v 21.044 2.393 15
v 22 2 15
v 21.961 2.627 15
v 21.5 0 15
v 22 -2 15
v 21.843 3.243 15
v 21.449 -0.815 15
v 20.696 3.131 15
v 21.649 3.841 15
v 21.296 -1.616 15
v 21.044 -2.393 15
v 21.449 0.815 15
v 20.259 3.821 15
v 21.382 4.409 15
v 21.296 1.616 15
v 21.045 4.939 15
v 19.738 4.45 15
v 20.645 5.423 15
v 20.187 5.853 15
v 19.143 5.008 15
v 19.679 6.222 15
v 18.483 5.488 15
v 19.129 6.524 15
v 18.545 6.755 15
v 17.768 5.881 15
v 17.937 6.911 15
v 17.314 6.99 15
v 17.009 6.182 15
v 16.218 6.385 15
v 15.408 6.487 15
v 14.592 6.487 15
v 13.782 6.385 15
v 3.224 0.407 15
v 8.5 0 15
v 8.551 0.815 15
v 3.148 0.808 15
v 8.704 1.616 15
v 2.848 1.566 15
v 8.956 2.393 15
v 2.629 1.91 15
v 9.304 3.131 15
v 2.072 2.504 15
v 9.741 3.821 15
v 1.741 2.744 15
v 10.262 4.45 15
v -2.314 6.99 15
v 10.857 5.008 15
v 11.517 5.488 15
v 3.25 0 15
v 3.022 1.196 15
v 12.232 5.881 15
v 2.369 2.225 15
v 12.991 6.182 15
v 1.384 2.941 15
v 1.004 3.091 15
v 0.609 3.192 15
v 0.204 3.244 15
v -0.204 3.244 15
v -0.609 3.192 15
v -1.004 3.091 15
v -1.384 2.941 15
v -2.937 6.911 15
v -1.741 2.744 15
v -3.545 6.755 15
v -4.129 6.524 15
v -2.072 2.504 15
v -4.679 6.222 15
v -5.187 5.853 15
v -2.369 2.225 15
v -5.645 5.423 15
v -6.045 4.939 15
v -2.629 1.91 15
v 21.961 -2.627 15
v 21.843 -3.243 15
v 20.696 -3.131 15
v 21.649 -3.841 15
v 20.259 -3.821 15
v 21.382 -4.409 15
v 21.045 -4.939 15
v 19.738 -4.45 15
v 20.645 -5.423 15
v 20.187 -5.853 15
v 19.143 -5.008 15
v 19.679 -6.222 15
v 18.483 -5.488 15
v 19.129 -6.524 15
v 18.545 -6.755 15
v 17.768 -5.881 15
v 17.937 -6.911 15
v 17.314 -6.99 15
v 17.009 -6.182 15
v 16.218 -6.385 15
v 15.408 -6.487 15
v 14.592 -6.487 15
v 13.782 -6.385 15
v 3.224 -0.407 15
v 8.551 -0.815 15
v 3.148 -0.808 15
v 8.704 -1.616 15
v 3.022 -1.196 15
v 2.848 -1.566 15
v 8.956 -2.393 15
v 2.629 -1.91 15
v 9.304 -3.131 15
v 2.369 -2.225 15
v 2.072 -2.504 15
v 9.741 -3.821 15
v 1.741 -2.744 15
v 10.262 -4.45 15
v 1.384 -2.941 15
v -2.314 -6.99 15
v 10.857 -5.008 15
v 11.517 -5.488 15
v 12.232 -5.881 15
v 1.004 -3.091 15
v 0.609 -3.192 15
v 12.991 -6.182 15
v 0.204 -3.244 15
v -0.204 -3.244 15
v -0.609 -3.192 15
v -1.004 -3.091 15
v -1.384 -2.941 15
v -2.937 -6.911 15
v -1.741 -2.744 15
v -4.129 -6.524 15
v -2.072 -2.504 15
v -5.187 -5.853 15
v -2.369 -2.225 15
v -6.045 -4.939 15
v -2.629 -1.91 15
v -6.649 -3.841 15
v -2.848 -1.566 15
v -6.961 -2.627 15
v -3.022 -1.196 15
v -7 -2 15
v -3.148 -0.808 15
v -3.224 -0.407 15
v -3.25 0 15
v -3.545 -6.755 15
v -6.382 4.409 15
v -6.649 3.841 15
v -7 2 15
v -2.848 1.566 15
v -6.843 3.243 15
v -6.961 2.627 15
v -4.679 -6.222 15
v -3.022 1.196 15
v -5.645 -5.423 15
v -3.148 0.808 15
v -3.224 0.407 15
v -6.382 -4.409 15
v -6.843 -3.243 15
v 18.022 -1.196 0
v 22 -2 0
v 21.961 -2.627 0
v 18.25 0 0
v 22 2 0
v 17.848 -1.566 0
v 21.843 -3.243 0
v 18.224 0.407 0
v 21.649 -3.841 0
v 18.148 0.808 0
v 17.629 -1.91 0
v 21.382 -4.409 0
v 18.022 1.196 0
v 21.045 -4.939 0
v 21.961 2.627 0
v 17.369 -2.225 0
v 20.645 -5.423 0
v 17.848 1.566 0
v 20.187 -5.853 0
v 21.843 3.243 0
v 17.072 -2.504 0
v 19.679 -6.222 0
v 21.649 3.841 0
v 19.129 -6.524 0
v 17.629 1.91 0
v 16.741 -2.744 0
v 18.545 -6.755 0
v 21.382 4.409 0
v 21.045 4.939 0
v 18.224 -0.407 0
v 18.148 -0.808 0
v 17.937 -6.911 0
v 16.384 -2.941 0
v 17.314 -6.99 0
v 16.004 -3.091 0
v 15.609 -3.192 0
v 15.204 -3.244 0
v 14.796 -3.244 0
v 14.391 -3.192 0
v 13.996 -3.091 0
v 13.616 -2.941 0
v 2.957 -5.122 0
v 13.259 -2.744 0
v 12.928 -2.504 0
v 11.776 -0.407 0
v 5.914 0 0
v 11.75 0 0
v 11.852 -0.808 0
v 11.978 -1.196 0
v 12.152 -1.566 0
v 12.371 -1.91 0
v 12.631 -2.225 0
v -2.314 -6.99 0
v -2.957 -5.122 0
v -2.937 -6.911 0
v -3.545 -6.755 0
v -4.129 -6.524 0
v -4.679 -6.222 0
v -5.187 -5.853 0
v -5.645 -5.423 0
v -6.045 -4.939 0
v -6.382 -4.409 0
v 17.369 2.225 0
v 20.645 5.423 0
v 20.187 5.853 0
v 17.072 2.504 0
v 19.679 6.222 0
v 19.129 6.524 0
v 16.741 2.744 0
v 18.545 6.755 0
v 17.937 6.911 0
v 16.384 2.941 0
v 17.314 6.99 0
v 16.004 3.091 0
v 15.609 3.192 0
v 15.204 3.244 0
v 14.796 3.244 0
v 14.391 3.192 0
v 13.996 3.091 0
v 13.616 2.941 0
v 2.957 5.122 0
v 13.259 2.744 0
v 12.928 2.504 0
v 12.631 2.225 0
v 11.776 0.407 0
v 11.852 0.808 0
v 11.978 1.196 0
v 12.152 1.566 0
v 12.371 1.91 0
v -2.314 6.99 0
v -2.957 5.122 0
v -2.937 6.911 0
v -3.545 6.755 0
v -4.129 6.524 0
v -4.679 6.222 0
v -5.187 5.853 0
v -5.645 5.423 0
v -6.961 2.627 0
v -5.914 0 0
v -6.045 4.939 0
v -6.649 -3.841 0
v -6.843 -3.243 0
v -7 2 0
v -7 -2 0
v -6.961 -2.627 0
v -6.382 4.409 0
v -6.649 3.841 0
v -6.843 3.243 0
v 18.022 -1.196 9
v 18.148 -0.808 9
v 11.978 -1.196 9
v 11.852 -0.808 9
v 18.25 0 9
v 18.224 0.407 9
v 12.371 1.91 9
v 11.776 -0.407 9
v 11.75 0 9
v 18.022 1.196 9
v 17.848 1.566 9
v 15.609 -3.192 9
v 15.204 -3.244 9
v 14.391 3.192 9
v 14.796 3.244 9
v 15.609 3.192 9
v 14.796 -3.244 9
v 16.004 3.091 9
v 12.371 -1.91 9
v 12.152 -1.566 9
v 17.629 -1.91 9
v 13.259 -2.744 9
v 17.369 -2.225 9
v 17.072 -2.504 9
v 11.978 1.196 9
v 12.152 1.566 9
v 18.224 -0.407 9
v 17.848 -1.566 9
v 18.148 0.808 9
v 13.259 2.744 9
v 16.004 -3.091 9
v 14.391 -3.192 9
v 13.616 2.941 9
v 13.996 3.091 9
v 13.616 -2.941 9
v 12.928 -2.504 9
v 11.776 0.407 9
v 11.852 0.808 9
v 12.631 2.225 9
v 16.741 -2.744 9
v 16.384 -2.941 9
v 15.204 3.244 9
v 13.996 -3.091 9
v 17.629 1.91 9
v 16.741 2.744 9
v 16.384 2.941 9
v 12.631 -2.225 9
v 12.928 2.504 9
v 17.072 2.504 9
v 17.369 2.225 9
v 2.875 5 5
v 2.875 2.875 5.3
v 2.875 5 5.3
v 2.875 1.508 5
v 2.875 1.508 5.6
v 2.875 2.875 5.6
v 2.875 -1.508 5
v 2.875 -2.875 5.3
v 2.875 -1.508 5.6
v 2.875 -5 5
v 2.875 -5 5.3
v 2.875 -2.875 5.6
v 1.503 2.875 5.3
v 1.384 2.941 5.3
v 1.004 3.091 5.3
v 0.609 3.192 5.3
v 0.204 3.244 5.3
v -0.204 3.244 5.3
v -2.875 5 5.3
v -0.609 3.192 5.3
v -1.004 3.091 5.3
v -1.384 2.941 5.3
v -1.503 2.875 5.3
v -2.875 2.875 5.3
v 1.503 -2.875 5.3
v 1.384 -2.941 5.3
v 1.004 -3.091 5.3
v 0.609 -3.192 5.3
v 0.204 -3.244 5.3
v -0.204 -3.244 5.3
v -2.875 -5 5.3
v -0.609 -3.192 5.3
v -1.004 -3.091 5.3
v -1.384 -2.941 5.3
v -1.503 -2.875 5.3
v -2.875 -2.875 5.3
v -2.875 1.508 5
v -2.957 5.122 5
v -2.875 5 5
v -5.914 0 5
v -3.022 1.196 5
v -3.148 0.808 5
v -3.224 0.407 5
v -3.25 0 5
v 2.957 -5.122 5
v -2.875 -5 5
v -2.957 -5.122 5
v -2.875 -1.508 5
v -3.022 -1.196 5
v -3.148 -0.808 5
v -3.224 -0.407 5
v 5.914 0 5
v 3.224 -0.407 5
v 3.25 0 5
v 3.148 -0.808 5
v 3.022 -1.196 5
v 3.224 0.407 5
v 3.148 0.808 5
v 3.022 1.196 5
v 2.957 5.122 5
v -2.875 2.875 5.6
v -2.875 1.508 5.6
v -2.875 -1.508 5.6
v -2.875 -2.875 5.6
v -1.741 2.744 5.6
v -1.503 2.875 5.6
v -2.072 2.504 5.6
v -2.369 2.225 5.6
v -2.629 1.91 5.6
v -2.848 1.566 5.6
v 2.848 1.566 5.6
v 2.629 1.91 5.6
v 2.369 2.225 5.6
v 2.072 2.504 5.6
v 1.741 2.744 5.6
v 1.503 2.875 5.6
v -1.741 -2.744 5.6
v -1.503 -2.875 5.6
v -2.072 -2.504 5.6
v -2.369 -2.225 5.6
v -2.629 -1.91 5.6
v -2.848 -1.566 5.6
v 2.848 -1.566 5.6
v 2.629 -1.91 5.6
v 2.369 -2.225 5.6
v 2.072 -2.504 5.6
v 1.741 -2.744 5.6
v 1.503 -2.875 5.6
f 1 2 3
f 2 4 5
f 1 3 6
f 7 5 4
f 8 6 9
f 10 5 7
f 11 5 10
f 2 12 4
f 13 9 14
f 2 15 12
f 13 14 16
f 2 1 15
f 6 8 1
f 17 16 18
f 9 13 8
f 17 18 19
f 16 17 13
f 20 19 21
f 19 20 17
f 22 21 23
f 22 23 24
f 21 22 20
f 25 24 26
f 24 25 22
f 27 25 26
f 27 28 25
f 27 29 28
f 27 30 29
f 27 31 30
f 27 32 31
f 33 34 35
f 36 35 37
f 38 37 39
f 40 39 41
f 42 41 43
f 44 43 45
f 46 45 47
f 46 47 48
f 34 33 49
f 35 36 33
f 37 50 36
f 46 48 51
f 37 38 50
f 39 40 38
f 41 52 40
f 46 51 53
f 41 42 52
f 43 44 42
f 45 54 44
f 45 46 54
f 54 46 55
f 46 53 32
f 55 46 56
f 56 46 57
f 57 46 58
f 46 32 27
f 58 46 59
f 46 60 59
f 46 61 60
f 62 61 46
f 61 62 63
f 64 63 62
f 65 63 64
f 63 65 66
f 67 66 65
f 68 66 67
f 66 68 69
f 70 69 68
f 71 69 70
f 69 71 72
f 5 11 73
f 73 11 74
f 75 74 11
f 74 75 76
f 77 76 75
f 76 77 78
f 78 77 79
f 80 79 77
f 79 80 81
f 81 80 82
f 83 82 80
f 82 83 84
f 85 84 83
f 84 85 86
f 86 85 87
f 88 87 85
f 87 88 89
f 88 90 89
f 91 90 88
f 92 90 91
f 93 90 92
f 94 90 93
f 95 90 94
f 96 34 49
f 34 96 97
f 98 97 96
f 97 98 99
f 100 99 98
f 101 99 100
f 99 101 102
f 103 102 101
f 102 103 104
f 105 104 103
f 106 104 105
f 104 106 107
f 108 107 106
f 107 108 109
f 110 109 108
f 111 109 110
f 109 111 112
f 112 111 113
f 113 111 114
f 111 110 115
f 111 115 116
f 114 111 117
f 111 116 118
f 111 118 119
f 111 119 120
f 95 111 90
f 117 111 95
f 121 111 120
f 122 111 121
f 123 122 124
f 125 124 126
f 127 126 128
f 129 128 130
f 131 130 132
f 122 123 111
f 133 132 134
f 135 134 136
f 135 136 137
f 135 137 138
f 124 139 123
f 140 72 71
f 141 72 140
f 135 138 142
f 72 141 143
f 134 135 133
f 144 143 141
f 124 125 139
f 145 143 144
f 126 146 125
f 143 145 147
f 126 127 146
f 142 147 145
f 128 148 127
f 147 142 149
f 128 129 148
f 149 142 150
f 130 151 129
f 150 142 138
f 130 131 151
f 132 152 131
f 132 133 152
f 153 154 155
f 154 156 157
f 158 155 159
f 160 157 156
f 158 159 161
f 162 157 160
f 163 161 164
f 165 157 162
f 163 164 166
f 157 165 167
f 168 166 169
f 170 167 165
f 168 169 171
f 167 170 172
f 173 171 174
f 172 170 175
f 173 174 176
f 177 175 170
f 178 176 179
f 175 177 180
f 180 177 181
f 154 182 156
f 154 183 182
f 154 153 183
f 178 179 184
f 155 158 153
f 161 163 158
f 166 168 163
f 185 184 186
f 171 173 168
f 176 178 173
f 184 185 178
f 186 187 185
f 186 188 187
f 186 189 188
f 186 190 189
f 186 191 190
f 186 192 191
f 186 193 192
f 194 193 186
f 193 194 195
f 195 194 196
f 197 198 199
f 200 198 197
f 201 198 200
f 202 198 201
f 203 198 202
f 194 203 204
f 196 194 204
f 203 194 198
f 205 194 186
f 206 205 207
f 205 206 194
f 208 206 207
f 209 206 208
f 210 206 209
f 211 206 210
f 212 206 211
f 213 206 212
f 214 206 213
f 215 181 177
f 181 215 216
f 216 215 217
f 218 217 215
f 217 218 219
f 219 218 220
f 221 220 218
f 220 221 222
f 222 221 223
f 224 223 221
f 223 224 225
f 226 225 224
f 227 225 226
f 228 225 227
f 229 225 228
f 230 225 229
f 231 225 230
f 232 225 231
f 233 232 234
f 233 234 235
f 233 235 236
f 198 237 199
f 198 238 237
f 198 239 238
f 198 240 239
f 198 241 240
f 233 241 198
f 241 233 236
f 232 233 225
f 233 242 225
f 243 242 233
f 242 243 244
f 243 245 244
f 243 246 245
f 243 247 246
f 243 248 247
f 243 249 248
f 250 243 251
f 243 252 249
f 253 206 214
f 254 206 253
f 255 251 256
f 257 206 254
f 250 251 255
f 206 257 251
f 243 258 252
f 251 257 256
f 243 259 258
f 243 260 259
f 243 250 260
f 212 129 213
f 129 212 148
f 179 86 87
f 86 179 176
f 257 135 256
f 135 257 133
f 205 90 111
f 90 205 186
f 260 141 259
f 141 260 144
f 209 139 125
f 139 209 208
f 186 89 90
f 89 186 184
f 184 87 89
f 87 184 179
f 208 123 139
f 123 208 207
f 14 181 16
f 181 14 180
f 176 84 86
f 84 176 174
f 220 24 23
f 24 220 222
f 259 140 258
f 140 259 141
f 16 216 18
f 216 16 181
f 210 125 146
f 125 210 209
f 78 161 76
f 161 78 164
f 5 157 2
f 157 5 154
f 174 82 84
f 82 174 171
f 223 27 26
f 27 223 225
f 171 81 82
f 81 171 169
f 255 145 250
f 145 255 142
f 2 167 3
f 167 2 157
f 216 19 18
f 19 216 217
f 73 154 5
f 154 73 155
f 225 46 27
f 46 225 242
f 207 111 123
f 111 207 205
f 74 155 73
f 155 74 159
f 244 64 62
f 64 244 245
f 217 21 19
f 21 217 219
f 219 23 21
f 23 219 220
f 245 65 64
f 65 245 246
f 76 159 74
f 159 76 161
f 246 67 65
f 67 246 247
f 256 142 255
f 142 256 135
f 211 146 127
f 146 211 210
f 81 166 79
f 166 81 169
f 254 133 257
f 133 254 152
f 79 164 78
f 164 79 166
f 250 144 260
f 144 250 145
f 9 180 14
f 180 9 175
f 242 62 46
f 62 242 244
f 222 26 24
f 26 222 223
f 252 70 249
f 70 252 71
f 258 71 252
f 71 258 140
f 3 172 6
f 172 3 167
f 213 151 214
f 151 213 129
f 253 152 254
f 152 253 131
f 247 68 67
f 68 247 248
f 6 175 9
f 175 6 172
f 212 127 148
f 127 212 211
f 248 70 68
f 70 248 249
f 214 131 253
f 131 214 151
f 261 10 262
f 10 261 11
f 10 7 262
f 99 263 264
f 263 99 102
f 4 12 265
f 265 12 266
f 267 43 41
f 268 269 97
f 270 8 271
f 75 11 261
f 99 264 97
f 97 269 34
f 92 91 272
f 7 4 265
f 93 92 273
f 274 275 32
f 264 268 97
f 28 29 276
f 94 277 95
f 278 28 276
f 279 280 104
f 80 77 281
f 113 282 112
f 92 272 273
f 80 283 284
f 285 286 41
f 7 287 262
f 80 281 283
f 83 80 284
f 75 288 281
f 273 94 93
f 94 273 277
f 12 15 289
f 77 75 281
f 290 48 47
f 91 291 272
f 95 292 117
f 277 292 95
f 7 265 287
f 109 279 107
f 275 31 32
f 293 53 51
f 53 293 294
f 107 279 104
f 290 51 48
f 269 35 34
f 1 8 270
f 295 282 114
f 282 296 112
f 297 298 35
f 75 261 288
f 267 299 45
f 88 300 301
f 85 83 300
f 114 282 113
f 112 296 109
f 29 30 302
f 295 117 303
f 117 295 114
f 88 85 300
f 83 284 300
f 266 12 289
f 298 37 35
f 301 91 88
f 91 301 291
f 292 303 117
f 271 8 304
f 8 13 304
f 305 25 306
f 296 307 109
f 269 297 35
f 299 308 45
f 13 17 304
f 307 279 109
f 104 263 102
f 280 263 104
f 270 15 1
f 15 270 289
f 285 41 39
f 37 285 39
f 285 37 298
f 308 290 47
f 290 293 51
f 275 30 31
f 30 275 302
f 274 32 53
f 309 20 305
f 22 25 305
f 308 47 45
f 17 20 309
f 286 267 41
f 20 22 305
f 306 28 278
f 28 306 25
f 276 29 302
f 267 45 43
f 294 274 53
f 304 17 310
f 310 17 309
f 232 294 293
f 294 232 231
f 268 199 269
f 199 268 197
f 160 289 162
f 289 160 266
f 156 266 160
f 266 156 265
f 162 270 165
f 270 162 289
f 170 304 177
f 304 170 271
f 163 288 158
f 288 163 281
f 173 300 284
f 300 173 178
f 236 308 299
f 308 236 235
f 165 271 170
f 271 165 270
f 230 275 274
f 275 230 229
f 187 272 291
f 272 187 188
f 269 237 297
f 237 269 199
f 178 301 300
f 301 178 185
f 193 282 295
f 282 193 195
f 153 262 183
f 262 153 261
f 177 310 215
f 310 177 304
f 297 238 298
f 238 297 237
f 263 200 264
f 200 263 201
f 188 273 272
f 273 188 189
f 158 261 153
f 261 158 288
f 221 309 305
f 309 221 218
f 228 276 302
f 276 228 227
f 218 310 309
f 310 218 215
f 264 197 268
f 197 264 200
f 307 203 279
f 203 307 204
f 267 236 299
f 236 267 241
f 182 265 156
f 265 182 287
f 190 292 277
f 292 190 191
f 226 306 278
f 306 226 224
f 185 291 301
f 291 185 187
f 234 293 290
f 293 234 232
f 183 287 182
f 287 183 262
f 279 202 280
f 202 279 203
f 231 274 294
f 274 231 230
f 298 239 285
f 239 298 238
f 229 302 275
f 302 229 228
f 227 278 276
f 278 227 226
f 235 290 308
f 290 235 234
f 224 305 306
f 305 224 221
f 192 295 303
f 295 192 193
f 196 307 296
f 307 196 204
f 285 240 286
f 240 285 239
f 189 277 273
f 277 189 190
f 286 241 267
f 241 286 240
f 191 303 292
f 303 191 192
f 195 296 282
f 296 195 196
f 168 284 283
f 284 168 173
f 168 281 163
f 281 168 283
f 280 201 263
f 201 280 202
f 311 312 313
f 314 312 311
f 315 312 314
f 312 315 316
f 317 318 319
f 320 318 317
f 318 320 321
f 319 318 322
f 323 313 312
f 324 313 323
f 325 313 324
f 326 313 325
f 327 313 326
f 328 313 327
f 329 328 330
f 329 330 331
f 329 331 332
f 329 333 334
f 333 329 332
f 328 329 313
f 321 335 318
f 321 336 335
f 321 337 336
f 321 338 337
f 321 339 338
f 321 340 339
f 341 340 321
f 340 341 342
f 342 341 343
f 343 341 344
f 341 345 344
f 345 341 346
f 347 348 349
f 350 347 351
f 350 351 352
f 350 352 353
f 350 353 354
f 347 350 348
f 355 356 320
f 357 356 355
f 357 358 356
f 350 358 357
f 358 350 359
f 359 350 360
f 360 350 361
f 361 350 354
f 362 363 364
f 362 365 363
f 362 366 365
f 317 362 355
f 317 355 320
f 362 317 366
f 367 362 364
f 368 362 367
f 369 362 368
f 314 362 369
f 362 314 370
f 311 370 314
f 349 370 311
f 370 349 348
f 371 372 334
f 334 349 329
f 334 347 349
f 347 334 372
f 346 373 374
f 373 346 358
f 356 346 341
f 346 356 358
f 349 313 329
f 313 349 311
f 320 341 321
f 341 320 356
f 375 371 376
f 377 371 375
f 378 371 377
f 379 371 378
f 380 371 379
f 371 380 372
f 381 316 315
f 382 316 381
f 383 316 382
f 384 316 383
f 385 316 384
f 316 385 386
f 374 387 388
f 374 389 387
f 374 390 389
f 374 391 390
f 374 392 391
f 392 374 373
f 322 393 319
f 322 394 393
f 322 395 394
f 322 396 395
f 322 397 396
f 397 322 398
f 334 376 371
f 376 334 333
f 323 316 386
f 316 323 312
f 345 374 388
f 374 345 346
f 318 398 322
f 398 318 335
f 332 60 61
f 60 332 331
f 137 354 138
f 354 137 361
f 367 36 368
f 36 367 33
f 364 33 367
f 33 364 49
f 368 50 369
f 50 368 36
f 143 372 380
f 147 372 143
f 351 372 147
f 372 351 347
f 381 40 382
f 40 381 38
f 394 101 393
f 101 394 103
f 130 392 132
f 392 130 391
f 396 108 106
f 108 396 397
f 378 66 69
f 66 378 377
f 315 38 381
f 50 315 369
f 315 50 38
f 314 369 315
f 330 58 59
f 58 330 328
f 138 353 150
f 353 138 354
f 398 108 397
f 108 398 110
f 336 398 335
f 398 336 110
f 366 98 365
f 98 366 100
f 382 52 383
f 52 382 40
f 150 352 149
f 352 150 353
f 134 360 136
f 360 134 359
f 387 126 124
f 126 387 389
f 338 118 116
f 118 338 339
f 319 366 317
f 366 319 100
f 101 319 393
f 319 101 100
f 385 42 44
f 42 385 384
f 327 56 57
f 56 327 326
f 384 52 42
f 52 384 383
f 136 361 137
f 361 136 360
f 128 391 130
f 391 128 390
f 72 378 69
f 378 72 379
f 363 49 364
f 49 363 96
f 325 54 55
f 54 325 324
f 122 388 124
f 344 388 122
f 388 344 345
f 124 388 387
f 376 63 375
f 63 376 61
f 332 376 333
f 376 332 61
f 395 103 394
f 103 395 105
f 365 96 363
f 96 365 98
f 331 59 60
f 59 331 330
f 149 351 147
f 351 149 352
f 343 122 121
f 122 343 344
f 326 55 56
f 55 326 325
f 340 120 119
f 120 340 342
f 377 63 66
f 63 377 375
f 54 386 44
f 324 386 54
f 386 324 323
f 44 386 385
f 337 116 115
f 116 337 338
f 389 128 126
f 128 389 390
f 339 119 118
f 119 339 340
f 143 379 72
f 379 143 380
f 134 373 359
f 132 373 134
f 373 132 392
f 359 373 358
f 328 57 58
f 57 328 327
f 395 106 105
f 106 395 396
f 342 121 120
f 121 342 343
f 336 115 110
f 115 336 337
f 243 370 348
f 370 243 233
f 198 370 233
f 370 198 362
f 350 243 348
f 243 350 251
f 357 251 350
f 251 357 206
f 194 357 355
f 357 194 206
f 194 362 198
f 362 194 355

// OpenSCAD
$fn = 50;


difference() {
	union() {
		cylinder(h = 15, r = 7.0000000000);
		translate(v = [7.5000000000, 0.0000000000, 0]) {
			hull() {
				translate(v = [-9.5000000000, 2.0000000000, 0]) {
					cylinder(h = 15, r = 5);
				}
				translate(v = [9.5000000000, 2.0000000000, 0]) {
					cylinder(h = 15, r = 5);
				}
				translate(v = [-9.5000000000, -2.0000000000, 0]) {
					cylinder(h = 15, r = 5);
				}
				translate(v = [9.5000000000, -2.0000000000, 0]) {
					cylinder(h = 15, r = 5);
				}
			}
		}
		translate(v = [7.5000000000, 0.0000000000, 0]) {
			hull() {
				translate(v = [-9.5000000000, 2.0000000000, 0]) {
					cylinder(h = 15, r = 5);
				}
				translate(v = [9.5000000000, 2.0000000000, 0]) {
					cylinder(h = 15, r = 5);
				}
				translate(v = [-9.5000000000, -2.0000000000, 0]) {
					cylinder(h = 15, r = 5);
				}
				translate(v = [9.5000000000, -2.0000000000, 0]) {
					cylinder(h = 15, r = 5);
				}
			}
		}
	}
	union() {
		translate(v = [15.0000000000, 0.0000000000, 15]) {
			rotate(a = [0, 0, 0]) {
				difference() {
					union() {
						#translate(v = [0, 0, -15.0000000000]) {
							cylinder(h = 15, r = 2.2500000000);
						}
						#translate(v = [0, 0, -6]) {
							cylinder(h = 6, r1 = 3.2500000000, r2 = 6.5000000000);
						}
						#translate(v = [0, 0, -15.0000000000]) {
							cylinder(h = 15, r = 3.2500000000);
						}
						#translate(v = [0, 0, -15.0000000000]) {
							cylinder(h = 15, r = 2.2500000000);
						}
					}
					union();
				}
			}
		}
		translate(v = [15.0000000000, 0.0000000000, 15]) {
			rotate(a = [0, 0, 0]) {
				difference() {
					union() {
						#translate(v = [0, 0, -15.0000000000]) {
							cylinder(h = 15, r = 2.2500000000);
						}
						#translate(v = [0, 0, -6]) {
							cylinder(h = 6, r1 = 3.2500000000, r2 = 6.5000000000);
						}
						#translate(v = [0, 0, -15.0000000000]) {
							cylinder(h = 15, r = 3.2500000000);
						}
						#translate(v = [0, 0, -15.0000000000]) {
							cylinder(h = 15, r = 2.2500000000);
						}
					}
					union();
				}
			}
		}
		translate(v = [0.0000000000, 0.0000000000, 0]) {
			rotate(a = [0, 0, 0]) {
				difference() {
					union() {
						#translate(v = [-2.8750000000, -5.0000000000, -0.3000000000]) {
							cube(size = [5.7500000000, 10, 0.3000000000]);
						}
						#translate(v = [-2.8750000000, -2.8750000000, -0.6000000000]) {
							cube(size = [5.7500000000, 5.7500000000, 0.3000000000]);
						}
						#translate(v = [-2.8750000000, -5.0000000000, 5]) {
							cube(size = [5.7500000000, 10, 0.3000000000]);
						}
						#translate(v = [-2.8750000000, -2.8750000000, 5.3000000000]) {
							cube(size = [5.7500000000, 5.7500000000, 0.3000000000]);
						}
						#translate(v = [0, 0, -100.0000000000]) {
							cylinder(h = 200, r = 3.2500000000);
						}
						#linear_extrude(height = 5) {
							polygon(points = [[5.9142500000, 0.0000000000], [2.9571250000, 5.1218907443], [-2.9571250000, 5.1218907443], [-5.9142500000, 0.0000000000], [-2.9571250000, -5.1218907443], [2.9571250000, -5.1218907443]]);
						}
						#translate(v = [-2.8750000000, -5.0000000000, -0.3000000000]) {
							cube(size = [5.7500000000, 10, 0.3000000000]);
						}
						#translate(v = [-2.8750000000, -2.8750000000, -0.6000000000]) {
							cube(size = [5.7500000000, 5.7500000000, 0.3000000000]);
						}
						#translate(v = [-2.8750000000, -5.0000000000, 5]) {
							cube(size = [5.7500000000, 10, 0.3000000000]);
						}
						#translate(v = [-2.8750000000, -2.8750000000, 5.3000000000]) {
							cube(size = [5.7500000000, 5.7500000000, 0.3000000000]);
						}
						#translate(v = [0, 0, -100.0000000000]) {
							cylinder(h = 200, r = 3.2500000000);
						}
						#translate(v = [-2.8750000000, -5.0000000000, -0.3000000000]) {
							cube(size = [5.7500000000, 10, 0.3000000000]);
						}
						#translate(v = [-2.8750000000, -2.8750000000, -0.6000000000]) {
							cube(size = [5.7500000000, 5.7500000000, 0.3000000000]);
						}
						#translate(v = [-2.8750000000, -5.0000000000, 5]) {
							cube(size = [5.7500000000, 10, 0.3000000000]);
						}
						#translate(v = [-2.8750000000, -2.8750000000, 5.3000000000]) {
							cube(size = [5.7500000000, 5.7500000000, 0.3000000000]);
						}
						#translate(v = [0, 0, -100.0000000000]) {
							cylinder(h = 200, r = 3.2500000000);
						}
					}
					union();
				}
			}
		}
		translate(v = [0, 0, -100]) {
			cylinder(h = 200, r = 3.2500000000);
		}
		translate(v = [0, 0, -100]) {
			cylinder(h = 200, r = 1.8000000000);
		}
	}
}
